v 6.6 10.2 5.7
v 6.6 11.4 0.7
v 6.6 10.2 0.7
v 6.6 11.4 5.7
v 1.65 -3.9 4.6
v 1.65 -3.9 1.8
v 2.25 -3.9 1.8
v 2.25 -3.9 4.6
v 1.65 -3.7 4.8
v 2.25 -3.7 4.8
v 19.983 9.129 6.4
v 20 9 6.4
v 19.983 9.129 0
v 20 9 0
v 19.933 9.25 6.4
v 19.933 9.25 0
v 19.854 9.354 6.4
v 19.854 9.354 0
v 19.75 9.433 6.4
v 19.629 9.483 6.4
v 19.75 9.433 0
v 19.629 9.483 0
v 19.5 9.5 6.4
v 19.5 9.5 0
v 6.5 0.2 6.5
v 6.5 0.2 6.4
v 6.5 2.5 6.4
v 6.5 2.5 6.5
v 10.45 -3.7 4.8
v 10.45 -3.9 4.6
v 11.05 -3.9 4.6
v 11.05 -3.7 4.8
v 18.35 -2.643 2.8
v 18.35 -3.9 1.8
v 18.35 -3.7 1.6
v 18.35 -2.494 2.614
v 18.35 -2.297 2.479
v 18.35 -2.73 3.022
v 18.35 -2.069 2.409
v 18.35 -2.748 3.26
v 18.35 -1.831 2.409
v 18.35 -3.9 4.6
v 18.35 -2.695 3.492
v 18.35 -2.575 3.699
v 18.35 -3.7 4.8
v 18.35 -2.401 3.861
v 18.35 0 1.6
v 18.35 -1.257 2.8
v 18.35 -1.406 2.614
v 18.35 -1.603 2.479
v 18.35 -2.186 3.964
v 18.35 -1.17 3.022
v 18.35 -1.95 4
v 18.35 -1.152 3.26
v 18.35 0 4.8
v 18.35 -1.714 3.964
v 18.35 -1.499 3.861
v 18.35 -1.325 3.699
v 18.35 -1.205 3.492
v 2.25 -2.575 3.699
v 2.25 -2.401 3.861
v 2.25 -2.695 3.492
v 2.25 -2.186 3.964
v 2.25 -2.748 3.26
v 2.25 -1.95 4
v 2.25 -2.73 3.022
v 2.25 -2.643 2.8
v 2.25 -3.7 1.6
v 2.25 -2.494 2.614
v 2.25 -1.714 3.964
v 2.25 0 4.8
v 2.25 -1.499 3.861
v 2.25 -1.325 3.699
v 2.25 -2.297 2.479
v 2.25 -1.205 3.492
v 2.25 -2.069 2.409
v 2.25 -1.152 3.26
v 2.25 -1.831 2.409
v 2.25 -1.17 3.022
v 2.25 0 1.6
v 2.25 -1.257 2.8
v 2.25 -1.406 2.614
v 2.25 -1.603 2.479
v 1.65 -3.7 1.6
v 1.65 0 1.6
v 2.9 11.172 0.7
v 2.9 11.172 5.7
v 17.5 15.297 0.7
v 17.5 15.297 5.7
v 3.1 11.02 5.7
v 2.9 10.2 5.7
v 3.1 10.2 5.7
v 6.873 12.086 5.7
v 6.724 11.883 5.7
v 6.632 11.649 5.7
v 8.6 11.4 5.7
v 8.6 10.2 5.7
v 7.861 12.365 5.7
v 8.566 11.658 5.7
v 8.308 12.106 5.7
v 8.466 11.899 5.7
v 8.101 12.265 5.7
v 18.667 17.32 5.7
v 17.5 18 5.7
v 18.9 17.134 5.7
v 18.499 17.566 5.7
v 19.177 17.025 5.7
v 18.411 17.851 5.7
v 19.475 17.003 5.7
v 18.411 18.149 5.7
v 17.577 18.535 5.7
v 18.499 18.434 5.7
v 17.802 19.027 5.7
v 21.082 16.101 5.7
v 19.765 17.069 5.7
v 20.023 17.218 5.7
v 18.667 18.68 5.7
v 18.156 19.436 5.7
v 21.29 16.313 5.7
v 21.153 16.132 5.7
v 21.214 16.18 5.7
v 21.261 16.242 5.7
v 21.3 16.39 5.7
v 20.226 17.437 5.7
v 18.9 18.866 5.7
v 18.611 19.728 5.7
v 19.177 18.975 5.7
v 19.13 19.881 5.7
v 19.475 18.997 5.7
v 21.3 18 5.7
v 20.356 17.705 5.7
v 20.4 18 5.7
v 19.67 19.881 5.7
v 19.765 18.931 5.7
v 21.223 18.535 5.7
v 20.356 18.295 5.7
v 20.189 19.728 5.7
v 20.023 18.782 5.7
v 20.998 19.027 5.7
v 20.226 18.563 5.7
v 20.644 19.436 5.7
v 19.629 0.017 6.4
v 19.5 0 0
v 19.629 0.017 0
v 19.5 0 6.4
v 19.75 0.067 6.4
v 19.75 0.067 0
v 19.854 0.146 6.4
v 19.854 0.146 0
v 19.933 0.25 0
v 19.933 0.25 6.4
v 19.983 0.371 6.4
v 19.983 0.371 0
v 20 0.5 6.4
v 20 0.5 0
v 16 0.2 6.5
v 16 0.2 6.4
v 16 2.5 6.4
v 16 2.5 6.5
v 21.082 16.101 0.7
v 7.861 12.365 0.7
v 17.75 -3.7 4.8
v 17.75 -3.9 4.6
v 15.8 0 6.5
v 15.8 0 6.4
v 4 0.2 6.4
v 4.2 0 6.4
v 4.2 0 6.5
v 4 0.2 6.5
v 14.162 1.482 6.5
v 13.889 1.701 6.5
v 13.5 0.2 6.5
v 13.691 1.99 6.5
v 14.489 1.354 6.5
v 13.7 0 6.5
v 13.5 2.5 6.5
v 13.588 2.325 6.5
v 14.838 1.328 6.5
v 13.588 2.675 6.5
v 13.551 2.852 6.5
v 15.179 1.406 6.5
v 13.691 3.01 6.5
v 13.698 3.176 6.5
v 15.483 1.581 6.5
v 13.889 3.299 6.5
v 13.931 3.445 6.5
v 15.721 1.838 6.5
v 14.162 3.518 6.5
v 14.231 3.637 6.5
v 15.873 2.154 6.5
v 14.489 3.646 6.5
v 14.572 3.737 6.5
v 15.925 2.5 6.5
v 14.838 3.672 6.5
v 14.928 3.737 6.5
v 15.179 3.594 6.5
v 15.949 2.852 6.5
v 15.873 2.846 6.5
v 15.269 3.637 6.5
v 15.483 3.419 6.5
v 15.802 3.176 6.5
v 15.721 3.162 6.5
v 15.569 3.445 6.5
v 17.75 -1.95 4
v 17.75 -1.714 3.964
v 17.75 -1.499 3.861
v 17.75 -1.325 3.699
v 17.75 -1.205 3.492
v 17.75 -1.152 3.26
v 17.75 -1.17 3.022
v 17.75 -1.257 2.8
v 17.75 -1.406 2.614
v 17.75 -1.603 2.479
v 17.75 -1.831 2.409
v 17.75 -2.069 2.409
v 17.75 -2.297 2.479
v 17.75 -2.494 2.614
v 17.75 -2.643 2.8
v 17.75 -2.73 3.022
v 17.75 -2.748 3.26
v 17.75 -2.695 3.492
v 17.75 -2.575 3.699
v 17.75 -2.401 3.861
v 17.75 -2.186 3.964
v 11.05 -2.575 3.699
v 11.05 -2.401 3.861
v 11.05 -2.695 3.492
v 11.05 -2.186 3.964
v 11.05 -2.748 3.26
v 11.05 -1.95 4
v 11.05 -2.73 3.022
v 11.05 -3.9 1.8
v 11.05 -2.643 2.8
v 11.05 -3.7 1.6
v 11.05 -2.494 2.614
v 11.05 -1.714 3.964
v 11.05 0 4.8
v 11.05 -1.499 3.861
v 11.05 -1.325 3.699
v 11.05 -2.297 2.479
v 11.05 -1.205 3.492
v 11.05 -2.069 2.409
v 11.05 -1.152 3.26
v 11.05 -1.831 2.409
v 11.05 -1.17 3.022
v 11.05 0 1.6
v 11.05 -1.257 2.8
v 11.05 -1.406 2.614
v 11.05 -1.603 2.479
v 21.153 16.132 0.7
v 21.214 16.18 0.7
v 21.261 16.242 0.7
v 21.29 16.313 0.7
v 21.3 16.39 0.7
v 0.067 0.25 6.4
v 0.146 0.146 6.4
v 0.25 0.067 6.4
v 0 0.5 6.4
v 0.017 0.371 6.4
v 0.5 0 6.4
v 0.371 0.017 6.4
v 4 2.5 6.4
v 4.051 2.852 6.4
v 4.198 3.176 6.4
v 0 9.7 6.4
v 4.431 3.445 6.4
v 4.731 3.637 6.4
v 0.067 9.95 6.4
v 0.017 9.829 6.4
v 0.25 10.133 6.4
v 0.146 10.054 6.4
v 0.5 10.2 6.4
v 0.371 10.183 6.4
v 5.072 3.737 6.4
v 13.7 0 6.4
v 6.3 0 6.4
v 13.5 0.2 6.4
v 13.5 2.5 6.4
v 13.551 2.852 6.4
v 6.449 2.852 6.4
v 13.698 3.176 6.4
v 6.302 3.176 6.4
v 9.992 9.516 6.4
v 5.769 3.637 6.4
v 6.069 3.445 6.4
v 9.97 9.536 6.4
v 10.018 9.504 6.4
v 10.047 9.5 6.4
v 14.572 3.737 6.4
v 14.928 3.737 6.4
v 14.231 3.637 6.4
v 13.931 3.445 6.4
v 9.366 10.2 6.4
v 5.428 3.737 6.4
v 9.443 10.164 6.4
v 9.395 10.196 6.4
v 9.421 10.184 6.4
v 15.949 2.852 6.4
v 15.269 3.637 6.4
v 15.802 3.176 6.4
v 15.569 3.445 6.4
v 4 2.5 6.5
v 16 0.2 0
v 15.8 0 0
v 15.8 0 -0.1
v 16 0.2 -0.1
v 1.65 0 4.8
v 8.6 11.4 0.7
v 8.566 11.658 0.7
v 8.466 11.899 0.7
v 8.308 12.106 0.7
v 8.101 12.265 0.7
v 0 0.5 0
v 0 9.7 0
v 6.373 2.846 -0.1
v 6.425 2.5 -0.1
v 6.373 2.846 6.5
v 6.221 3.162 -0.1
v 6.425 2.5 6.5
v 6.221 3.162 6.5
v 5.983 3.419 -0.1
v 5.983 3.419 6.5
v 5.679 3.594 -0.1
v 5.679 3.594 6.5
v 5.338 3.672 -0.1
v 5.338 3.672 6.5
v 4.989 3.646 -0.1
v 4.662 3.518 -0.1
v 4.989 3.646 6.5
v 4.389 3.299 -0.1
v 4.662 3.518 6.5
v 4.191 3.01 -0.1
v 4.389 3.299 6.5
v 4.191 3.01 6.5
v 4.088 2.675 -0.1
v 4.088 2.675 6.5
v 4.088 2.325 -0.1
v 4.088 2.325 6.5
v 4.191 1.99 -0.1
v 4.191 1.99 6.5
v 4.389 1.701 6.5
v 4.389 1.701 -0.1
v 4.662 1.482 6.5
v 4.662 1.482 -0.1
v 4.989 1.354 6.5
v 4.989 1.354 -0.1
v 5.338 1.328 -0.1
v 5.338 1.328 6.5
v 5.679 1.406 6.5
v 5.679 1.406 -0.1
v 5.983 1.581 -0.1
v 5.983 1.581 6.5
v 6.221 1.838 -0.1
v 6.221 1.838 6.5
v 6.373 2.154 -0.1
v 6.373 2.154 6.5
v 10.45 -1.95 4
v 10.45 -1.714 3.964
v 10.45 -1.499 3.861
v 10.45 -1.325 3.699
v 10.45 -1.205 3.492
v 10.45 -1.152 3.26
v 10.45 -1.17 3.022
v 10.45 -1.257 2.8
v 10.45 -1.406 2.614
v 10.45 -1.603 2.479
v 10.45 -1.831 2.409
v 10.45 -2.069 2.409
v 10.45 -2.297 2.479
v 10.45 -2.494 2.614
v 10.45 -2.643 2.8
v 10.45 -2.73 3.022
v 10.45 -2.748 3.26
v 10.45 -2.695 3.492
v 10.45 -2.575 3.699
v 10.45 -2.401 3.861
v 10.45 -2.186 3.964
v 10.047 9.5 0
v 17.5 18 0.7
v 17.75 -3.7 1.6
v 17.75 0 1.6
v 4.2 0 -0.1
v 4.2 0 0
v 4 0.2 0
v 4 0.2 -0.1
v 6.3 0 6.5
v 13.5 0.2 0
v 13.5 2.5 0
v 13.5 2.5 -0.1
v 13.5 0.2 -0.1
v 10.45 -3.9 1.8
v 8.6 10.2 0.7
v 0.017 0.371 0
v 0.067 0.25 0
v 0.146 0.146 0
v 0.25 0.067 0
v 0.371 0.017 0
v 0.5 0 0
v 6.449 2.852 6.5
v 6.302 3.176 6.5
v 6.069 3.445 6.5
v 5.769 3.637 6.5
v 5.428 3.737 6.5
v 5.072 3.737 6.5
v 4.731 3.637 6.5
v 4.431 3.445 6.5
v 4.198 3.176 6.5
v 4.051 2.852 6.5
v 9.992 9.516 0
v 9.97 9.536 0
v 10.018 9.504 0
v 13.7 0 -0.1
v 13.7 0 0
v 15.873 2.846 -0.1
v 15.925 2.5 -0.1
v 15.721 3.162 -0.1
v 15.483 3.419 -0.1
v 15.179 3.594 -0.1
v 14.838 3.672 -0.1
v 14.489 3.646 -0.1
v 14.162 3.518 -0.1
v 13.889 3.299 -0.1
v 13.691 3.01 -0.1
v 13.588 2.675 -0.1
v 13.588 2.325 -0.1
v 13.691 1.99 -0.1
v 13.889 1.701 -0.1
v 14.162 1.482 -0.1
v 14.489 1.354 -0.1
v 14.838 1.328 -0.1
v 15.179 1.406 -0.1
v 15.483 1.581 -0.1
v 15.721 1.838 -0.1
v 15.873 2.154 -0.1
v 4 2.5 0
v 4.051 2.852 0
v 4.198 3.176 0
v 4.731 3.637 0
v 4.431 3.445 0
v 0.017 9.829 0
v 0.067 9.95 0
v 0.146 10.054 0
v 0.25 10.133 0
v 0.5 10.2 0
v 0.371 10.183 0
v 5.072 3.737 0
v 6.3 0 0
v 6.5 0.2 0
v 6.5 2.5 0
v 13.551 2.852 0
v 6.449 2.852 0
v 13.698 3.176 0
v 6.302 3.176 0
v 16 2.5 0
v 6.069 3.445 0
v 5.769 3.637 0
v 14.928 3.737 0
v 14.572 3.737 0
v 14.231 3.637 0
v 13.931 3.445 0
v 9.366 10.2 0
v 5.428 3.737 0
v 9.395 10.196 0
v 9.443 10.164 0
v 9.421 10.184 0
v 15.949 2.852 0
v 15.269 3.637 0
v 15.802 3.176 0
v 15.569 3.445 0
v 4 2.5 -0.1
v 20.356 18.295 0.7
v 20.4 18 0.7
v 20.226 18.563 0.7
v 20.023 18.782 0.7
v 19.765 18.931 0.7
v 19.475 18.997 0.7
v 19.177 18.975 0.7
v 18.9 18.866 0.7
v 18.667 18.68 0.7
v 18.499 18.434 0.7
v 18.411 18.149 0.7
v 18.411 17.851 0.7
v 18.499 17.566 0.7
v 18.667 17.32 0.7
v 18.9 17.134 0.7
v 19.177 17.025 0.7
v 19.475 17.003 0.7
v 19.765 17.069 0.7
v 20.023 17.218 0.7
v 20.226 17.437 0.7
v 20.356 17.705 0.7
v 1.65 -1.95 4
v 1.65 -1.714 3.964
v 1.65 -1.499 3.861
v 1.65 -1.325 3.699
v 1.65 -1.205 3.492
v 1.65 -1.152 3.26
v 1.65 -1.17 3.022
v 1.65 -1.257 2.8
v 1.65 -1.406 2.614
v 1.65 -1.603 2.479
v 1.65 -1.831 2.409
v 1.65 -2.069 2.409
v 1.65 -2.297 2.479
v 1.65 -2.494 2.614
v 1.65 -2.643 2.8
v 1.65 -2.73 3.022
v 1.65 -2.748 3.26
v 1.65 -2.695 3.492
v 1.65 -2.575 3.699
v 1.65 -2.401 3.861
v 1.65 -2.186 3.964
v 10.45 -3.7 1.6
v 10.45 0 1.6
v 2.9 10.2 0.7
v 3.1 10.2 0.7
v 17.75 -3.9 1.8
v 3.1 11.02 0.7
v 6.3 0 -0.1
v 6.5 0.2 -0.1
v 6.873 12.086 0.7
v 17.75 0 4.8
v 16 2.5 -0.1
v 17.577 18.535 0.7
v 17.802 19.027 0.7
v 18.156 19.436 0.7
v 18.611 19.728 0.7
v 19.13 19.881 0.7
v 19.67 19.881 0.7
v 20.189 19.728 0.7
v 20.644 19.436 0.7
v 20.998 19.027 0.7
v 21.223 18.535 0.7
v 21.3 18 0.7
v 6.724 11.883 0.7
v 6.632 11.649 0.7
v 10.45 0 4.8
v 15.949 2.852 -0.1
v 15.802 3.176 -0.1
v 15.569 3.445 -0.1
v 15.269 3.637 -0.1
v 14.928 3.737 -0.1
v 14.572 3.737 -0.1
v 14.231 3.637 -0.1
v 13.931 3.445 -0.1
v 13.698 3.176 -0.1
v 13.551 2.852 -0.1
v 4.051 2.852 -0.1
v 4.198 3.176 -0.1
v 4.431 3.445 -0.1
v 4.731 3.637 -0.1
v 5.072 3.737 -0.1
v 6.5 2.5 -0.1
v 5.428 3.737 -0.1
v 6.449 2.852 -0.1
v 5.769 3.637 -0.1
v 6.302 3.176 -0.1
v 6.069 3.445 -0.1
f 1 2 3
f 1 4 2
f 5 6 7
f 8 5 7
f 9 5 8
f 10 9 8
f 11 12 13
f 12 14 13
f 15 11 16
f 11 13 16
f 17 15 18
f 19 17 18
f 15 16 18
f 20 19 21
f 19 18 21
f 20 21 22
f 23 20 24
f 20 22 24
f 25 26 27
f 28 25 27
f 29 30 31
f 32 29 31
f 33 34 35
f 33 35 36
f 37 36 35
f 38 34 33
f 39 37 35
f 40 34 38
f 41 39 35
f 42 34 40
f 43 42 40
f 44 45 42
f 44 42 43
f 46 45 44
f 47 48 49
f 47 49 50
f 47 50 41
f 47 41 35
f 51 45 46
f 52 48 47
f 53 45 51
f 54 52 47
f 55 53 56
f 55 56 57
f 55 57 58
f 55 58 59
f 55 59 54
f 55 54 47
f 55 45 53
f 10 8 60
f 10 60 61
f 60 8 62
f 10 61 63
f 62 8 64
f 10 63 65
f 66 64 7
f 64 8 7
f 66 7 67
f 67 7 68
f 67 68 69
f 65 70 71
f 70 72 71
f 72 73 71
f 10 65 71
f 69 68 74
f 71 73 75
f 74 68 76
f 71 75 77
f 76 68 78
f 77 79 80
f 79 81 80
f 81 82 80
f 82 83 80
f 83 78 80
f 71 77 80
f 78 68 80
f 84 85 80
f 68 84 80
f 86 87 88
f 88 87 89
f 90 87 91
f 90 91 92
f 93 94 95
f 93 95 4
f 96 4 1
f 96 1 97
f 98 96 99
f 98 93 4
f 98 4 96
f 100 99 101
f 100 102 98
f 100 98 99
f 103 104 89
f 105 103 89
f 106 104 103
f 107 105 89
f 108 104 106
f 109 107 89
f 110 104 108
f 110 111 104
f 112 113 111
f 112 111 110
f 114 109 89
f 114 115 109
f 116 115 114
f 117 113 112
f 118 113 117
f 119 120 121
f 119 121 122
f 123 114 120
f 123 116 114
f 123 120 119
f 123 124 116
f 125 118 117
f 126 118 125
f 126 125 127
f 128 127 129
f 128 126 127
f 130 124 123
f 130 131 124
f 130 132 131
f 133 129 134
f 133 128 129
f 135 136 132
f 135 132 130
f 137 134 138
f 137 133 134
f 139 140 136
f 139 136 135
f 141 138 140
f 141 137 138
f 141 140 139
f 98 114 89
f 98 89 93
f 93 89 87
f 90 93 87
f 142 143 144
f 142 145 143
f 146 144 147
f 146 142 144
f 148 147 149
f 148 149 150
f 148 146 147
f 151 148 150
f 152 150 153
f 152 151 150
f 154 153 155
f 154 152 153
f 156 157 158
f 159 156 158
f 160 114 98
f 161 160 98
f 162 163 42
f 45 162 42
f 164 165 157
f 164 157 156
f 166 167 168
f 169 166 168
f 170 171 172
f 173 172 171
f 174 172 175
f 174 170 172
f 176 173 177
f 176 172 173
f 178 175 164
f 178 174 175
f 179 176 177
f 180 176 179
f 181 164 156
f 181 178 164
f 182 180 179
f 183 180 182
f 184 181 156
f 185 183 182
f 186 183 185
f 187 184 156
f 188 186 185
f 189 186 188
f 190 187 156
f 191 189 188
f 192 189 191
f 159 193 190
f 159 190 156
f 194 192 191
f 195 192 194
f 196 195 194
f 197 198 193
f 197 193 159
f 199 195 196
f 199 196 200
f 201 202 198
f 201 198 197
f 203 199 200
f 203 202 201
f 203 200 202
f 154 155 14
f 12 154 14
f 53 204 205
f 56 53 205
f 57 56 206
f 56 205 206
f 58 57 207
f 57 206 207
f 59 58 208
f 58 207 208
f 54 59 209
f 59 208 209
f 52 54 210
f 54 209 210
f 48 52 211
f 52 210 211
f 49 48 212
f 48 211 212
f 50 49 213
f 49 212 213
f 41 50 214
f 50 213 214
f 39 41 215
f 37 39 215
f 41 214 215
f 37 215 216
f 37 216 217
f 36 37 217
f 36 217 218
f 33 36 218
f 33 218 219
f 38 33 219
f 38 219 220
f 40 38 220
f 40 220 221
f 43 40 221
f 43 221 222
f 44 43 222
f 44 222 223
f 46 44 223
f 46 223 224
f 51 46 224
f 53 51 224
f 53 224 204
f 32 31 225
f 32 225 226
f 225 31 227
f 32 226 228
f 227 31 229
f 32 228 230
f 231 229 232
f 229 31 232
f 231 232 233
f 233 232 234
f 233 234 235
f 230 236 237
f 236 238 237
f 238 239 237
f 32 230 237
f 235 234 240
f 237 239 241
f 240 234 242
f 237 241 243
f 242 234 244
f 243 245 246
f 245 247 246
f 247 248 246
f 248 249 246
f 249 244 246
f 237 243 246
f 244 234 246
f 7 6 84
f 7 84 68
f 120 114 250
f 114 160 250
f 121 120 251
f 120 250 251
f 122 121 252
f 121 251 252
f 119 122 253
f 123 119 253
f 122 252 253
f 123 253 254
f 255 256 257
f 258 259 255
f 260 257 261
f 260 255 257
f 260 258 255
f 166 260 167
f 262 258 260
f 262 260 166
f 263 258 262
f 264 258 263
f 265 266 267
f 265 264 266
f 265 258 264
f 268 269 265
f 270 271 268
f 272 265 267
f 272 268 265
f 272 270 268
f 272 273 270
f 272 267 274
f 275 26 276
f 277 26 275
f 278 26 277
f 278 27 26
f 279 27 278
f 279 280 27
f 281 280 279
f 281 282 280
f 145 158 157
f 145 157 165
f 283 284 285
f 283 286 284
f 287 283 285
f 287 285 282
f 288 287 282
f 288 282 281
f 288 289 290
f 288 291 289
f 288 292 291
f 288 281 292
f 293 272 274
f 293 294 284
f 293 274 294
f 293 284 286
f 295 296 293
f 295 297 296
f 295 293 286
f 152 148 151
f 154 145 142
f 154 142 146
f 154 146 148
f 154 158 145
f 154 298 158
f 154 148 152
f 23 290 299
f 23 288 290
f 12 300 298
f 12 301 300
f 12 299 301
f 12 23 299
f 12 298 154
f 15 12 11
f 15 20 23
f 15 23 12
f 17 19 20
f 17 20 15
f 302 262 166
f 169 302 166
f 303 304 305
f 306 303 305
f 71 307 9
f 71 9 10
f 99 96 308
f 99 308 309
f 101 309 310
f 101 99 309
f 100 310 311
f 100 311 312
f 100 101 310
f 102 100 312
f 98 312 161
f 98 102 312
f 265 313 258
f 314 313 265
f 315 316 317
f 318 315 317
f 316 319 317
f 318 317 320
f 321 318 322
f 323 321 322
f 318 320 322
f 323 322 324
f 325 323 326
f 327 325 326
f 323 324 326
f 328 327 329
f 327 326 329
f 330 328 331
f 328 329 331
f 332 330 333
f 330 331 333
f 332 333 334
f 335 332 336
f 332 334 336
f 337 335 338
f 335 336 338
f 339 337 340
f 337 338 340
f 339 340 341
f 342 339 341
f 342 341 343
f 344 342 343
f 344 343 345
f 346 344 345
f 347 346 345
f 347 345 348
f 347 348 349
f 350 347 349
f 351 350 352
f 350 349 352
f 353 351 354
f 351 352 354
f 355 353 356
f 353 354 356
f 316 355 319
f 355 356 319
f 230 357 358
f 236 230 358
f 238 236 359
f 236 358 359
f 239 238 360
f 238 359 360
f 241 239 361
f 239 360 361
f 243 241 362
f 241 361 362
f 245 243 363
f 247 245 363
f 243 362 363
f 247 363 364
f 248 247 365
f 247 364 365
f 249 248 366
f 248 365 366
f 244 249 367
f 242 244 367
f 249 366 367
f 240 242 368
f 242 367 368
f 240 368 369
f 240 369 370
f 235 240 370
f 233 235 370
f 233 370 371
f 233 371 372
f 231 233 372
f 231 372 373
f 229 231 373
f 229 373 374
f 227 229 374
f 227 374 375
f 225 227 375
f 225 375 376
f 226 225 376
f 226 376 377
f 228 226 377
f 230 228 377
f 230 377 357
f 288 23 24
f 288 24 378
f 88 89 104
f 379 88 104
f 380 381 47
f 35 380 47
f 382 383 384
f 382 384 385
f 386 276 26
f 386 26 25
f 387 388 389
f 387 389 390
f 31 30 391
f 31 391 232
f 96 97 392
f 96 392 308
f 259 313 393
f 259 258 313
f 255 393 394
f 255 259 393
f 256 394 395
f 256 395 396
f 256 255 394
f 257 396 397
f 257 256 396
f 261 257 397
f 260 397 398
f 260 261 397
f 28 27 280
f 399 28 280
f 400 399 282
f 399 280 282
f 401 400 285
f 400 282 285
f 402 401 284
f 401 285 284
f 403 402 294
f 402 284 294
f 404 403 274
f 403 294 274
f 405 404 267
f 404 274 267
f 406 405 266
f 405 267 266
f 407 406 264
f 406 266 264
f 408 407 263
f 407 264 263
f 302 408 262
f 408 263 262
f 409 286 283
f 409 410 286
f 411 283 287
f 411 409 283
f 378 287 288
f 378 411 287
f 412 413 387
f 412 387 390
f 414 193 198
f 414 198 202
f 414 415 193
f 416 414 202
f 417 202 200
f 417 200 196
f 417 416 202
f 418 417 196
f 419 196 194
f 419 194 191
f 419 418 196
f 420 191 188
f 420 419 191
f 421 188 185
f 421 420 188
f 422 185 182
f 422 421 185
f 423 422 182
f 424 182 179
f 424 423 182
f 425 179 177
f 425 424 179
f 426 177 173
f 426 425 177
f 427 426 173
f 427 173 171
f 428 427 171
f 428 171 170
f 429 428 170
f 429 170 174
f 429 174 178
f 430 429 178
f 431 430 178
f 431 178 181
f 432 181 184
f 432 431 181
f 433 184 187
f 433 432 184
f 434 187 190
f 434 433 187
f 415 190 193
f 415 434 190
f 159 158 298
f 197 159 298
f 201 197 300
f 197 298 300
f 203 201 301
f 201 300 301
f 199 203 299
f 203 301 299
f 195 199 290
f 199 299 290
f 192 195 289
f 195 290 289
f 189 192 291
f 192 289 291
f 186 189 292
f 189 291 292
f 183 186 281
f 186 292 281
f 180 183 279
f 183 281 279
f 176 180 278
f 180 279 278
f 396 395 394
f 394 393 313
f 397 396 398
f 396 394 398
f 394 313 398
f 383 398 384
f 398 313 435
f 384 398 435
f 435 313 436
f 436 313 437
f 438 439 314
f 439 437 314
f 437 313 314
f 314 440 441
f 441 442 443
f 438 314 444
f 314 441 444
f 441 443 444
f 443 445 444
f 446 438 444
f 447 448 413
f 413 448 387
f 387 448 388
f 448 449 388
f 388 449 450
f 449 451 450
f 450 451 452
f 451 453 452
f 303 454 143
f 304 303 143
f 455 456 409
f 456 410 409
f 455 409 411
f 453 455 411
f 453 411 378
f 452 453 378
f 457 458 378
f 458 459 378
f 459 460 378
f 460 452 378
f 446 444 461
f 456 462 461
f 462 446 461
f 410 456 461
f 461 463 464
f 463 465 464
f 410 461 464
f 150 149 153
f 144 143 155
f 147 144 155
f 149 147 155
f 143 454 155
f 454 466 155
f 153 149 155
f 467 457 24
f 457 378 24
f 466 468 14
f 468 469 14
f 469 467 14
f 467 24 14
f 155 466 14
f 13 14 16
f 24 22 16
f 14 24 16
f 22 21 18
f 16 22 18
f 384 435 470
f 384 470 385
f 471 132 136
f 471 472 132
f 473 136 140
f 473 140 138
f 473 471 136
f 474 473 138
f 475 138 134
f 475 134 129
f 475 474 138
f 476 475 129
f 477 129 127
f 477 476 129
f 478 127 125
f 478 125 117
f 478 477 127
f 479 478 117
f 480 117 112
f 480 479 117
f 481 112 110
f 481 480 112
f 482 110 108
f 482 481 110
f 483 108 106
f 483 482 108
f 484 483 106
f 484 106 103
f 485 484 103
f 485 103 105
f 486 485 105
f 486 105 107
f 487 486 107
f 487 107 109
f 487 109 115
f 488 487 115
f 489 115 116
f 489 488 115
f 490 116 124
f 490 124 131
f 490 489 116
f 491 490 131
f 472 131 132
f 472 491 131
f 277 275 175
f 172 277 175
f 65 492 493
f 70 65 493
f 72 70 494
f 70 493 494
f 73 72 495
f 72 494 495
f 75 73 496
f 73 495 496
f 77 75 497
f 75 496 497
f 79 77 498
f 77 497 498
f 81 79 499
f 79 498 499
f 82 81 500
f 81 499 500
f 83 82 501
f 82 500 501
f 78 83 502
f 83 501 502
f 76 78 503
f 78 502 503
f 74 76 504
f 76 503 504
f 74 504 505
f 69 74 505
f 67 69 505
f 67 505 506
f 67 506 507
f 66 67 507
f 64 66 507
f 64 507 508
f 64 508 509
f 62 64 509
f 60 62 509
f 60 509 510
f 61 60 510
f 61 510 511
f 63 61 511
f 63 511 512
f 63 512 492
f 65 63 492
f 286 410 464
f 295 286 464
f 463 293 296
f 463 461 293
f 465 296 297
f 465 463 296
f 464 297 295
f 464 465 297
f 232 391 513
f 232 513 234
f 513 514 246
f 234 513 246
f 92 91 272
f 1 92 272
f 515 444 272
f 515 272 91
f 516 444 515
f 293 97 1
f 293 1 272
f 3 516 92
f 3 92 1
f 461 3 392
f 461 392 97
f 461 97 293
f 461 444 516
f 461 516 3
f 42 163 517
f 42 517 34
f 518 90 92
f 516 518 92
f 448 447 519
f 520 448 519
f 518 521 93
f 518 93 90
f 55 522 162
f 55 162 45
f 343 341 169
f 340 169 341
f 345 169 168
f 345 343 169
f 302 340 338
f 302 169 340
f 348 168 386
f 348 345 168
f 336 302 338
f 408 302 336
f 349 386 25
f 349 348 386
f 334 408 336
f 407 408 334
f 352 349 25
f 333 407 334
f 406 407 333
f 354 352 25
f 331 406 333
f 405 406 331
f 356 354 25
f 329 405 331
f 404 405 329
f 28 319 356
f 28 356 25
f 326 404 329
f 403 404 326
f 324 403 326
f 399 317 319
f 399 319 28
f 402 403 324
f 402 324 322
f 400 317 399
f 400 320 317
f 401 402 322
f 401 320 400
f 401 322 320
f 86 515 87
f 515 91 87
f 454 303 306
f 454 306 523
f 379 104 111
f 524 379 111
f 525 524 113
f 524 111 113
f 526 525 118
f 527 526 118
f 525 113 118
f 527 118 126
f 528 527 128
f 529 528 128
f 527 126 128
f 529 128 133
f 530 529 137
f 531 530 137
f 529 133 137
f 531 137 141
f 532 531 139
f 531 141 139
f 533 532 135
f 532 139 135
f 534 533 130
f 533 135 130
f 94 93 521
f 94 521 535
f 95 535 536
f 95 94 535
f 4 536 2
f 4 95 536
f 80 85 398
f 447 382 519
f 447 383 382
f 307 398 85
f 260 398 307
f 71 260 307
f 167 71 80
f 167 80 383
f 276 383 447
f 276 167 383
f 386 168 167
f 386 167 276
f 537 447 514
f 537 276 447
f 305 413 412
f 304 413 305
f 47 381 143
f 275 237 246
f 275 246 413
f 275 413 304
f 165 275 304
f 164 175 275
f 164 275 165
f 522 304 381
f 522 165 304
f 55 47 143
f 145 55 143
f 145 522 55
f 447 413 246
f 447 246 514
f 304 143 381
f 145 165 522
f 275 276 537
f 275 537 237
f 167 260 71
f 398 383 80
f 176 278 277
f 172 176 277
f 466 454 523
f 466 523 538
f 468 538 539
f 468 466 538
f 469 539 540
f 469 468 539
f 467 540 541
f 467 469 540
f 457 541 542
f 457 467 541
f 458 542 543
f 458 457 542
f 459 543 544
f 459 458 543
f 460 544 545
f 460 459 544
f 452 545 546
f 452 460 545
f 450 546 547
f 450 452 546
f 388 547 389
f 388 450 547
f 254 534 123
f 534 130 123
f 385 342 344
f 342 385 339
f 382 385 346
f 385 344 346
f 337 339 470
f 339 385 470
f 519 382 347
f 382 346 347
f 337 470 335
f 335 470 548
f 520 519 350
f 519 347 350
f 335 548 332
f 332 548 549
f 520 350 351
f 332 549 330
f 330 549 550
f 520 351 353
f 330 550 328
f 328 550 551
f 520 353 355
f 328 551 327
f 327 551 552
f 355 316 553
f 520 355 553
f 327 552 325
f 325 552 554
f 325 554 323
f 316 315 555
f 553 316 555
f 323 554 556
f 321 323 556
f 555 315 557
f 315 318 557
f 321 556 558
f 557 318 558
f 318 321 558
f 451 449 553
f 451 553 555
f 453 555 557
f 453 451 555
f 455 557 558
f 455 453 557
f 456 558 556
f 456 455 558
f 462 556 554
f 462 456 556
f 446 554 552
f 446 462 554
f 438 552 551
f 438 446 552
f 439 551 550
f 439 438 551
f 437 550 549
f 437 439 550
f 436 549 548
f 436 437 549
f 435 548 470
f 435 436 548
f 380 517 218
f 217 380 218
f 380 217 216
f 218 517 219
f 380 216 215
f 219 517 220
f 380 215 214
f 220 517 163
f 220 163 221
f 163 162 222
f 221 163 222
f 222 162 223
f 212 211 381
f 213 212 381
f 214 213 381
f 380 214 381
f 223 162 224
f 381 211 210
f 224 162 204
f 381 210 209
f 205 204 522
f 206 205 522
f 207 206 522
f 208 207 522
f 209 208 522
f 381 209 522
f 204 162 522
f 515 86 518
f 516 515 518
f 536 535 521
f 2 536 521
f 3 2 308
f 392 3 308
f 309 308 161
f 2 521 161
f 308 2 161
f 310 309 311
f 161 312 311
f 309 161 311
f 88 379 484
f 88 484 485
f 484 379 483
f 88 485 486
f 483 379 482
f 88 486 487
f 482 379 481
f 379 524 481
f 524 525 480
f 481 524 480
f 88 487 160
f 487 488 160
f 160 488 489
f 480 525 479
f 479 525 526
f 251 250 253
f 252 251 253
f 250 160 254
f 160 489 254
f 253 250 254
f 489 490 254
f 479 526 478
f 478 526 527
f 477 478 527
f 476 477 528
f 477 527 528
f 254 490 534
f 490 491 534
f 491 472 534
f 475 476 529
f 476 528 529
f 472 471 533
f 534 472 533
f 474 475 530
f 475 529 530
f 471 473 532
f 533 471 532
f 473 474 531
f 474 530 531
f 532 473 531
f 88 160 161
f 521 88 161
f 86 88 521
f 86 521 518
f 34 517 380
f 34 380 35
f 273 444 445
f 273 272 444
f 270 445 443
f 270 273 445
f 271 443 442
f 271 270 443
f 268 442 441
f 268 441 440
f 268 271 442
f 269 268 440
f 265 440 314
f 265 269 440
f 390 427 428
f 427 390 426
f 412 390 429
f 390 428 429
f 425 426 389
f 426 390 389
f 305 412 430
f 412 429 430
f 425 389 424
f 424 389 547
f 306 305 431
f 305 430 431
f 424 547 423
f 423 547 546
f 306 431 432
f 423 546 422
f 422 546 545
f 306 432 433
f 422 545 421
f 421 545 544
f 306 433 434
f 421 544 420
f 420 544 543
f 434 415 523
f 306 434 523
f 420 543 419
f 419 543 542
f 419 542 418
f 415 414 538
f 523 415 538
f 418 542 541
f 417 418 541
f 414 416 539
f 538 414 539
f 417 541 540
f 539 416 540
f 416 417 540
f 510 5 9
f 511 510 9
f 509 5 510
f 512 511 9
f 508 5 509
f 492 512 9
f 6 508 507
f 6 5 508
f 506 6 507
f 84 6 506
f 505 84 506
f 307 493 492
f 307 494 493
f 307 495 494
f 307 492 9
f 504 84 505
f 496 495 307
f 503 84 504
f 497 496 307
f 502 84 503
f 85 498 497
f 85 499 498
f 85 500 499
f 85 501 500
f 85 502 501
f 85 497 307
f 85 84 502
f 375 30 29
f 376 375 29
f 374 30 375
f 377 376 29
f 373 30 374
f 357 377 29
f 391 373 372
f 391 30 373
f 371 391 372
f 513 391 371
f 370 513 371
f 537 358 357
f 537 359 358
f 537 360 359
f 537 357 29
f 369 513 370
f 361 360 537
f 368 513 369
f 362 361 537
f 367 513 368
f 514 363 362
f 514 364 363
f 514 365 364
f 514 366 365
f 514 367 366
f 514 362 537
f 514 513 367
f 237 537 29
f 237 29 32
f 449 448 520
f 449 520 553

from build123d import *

# Parameters (mm, degrees)
SKETCH_1_W               = 20
SKETCH_1_H               = 10.2
SKETCH_1_R               = 1.175
EXTRUDE_1_DEPTH          = 6.4
CUT_EXTRUDE_1_DEPTH      = 1
CUT_EXTRUDE_1_DEPTH_BACK = 7.4
FILLET_1_R               = 0.1
FILLET_2_R               = 0.5
SKETCH_8_R               = 1.175
EXTRUDE_5_DEPTH          = 0.1
CHAMFER_1_SIZE           = 0.2
SKETCH_3_W               = 0.6
SKETCH_3_H               = 3.9
EXTRUDE_2_DEPTH          = 1.6
SKETCH_9_R               = 0.8
CUT_EXTRUDE_2_DEPTH      = 19.35
CHAMFER_2_SIZE           = 0.2
SKETCH_5_R               = 1
EXTRUDE_3_DEPTH          = 2.5
EXTRUDE_6_DEPTH          = 2.5
FILLET_3_R               = 0.3


with BuildPart() as part:
    # 草图1 → 凸台-拉伸1 (new body)
    with BuildSketch(Plane.XY):
        with Locations((10, 5.1)):
            Rectangle(SKETCH_1_W, SKETCH_1_H)
        with Locations((5.25, 2.5)):
            Circle(SKETCH_1_R, mode=Mode.SUBTRACT)
        with Locations((14.75, 2.5)):
            Circle(SKETCH_1_R, mode=Mode.SUBTRACT)
    extrude(amount=EXTRUDE_1_DEPTH)

    # 草图7 → 切除-拉伸1 (cut, two sides)
    with BuildSketch(Plane.XY.offset(6.4)) as cut_extrude_1_sk:
        Polygon((20, 9.5), (10, 9.5), (9.412630258, 10.2), (20, 10.2), align=None)
    extrude(amount=CUT_EXTRUDE_1_DEPTH, mode=Mode.SUBTRACT)
    extrude(cut_extrude_1_sk.sketch, amount=-CUT_EXTRUDE_1_DEPTH_BACK, mode=Mode.SUBTRACT)

    # 圆角1
    fillet_1_edges = [part.edges().sort_by_distance(p)[0] for p in [
        (9.412630258, 10.2, 3.2),
        (10, 9.5, 3.2),
    ]]
    fillet(fillet_1_edges, radius=FILLET_1_R)

    # 圆角2
    fillet_2_edges = [part.edges().sort_by_distance(p)[0] for p in [
        (20, 9.5, 3.2),
        (0, 10.2, 3.2),
        (20, 0, 3.2),
        (0, 0, 3.2),
    ]]
    fillet(fillet_2_edges, radius=FILLET_2_R)

    # 草图8 → 凸台-拉伸5 (add)
    with BuildSketch(Plane.XY.offset(6.4)):
        with BuildLine():
            Line((4, 2.5), (4, 0))
            Line((4, 0), (6.5, 0))
            Line((6.5, 0), (6.5, 2.5))
            ThreePointArc((6.5, 2.5), (5.25, 3.75), (4, 2.5))
        make_face()
        with Locations((5.25, 2.5)):
            Circle(SKETCH_8_R, mode=Mode.SUBTRACT)
        with BuildLine():
            Line((13.5, 2.5), (13.5, 0))
            Line((13.5, 0), (16, 0))
            Line((16, 0), (16, 2.5))
            ThreePointArc((16, 2.5), (14.75, 3.75), (13.5, 2.5))
        make_face()
        with Locations((14.75, 2.5)):
            Circle(SKETCH_8_R, mode=Mode.SUBTRACT)
    extrude_5 = extrude(amount=EXTRUDE_5_DEPTH)

    # 镜向1: 凸台-拉伸5 across plane
    add(extrude_5.mirror(Plane.XY.offset(3.2)))

    # 倒角1
    chamfer_1_edges = [part.edges().sort_by_distance(p)[0] for p in [
        (6.5, 0, -0.05),
        (4, 0, -0.05),
        (16, 0, -0.05),
        (13.5, 0, -0.05),
        (4, 0, 6.45),
        (6.5, 0, 6.45),
        (13.5, 0, 6.45),
        (16, 0, 6.45),
    ]]
    chamfer(chamfer_1_edges, length=CHAMFER_1_SIZE)

    # 草图3 → 凸台-拉伸2 (add, symmetric)
    with BuildSketch(Plane.XY.offset(3.2)):
        with Locations((1.95, -1.95)):
            Rectangle(SKETCH_3_W, SKETCH_3_H)
        with Locations((10.75, -1.95)):
            Rectangle(SKETCH_3_W, SKETCH_3_H)
        with Locations((18.05, -1.95)):
            Rectangle(SKETCH_3_W, SKETCH_3_H)
    extrude(amount=EXTRUDE_2_DEPTH, both=True)

    # 草图9 → 切除-拉伸2 (cut, through all)
    with BuildSketch(Plane.ZY.offset(-1.65)):
        with Locations((3.2, -1.95)):
            Circle(SKETCH_9_R)
    extrude(amount=-CUT_EXTRUDE_2_DEPTH, mode=Mode.SUBTRACT)

    # 倒角2
    chamfer_2_edges = [part.edges().sort_by_distance(p)[0] for p in [
        (1.95, -3.9, 1.6),
        (1.95, -3.9, 4.8),
        (10.75, -3.9, 1.6),
        (10.75, -3.9, 4.8),
        (18.05, -3.9, 1.6),
        (18.05, -3.9, 4.8),
    ]]
    chamfer(chamfer_2_edges, length=CHAMFER_2_SIZE)



with BuildPart() as body_2:
    # 草图5 → 凸台-拉伸3 (new body, symmetric)
    with BuildSketch(Plane.XY.offset(3.2)):
        with BuildLine():
            Line((21.3, 18), (21.3, 16.267087306))
            Line((21.3, 16.267087306), (21.3, 16.163171396))
            Line((21.3, 16.163171396), (3.1, 11.020209549))
            Line((3.1, 11.020209549), (3.1, 10.193829773))
            Line((3.1, 10.193829773), (2.9, 10.2))
            Line((2.9, 10.2), (2.9, 11.171525305))
            Line((2.9, 11.171525305), (17.5, 15.297197995))
            Line((17.5, 15.297197995), (17.5, 18))
            ThreePointArc((17.5, 18), (19.4, 19.9), (21.3, 18))
        make_face()
        with Locations((19.4, 18)):
            Circle(SKETCH_5_R, mode=Mode.SUBTRACT)
    extrude(amount=EXTRUDE_3_DEPTH, both=True)


with BuildPart() as part_1:
    add(part.part)

    add(body_2.part)  # 凸台-拉伸6 merges body 2
    # 草图10 → 凸台-拉伸6 (add, symmetric)
    with BuildSketch(Plane.XY.offset(3.2)):
        with BuildLine():
            Line((6.6, 11.4), (6.6, 10.2))
            Line((6.6, 10.2), (8.6, 10.2))
            Line((8.6, 10.2), (8.6, 11.4))
            ThreePointArc((8.6, 11.4), (7.6, 12.4), (6.6, 11.4))
        make_face()
    extrude(amount=EXTRUDE_6_DEPTH, both=True)

    # 圆角3
    fillet_3_edges = [part_1.edges().sort_by_distance(p)[0] for p in [
        (21.3, 16.163171396, 3.2),
    ]]
    fillet(fillet_3_edges, radius=FILLET_3_R)


solid = part_1.part
